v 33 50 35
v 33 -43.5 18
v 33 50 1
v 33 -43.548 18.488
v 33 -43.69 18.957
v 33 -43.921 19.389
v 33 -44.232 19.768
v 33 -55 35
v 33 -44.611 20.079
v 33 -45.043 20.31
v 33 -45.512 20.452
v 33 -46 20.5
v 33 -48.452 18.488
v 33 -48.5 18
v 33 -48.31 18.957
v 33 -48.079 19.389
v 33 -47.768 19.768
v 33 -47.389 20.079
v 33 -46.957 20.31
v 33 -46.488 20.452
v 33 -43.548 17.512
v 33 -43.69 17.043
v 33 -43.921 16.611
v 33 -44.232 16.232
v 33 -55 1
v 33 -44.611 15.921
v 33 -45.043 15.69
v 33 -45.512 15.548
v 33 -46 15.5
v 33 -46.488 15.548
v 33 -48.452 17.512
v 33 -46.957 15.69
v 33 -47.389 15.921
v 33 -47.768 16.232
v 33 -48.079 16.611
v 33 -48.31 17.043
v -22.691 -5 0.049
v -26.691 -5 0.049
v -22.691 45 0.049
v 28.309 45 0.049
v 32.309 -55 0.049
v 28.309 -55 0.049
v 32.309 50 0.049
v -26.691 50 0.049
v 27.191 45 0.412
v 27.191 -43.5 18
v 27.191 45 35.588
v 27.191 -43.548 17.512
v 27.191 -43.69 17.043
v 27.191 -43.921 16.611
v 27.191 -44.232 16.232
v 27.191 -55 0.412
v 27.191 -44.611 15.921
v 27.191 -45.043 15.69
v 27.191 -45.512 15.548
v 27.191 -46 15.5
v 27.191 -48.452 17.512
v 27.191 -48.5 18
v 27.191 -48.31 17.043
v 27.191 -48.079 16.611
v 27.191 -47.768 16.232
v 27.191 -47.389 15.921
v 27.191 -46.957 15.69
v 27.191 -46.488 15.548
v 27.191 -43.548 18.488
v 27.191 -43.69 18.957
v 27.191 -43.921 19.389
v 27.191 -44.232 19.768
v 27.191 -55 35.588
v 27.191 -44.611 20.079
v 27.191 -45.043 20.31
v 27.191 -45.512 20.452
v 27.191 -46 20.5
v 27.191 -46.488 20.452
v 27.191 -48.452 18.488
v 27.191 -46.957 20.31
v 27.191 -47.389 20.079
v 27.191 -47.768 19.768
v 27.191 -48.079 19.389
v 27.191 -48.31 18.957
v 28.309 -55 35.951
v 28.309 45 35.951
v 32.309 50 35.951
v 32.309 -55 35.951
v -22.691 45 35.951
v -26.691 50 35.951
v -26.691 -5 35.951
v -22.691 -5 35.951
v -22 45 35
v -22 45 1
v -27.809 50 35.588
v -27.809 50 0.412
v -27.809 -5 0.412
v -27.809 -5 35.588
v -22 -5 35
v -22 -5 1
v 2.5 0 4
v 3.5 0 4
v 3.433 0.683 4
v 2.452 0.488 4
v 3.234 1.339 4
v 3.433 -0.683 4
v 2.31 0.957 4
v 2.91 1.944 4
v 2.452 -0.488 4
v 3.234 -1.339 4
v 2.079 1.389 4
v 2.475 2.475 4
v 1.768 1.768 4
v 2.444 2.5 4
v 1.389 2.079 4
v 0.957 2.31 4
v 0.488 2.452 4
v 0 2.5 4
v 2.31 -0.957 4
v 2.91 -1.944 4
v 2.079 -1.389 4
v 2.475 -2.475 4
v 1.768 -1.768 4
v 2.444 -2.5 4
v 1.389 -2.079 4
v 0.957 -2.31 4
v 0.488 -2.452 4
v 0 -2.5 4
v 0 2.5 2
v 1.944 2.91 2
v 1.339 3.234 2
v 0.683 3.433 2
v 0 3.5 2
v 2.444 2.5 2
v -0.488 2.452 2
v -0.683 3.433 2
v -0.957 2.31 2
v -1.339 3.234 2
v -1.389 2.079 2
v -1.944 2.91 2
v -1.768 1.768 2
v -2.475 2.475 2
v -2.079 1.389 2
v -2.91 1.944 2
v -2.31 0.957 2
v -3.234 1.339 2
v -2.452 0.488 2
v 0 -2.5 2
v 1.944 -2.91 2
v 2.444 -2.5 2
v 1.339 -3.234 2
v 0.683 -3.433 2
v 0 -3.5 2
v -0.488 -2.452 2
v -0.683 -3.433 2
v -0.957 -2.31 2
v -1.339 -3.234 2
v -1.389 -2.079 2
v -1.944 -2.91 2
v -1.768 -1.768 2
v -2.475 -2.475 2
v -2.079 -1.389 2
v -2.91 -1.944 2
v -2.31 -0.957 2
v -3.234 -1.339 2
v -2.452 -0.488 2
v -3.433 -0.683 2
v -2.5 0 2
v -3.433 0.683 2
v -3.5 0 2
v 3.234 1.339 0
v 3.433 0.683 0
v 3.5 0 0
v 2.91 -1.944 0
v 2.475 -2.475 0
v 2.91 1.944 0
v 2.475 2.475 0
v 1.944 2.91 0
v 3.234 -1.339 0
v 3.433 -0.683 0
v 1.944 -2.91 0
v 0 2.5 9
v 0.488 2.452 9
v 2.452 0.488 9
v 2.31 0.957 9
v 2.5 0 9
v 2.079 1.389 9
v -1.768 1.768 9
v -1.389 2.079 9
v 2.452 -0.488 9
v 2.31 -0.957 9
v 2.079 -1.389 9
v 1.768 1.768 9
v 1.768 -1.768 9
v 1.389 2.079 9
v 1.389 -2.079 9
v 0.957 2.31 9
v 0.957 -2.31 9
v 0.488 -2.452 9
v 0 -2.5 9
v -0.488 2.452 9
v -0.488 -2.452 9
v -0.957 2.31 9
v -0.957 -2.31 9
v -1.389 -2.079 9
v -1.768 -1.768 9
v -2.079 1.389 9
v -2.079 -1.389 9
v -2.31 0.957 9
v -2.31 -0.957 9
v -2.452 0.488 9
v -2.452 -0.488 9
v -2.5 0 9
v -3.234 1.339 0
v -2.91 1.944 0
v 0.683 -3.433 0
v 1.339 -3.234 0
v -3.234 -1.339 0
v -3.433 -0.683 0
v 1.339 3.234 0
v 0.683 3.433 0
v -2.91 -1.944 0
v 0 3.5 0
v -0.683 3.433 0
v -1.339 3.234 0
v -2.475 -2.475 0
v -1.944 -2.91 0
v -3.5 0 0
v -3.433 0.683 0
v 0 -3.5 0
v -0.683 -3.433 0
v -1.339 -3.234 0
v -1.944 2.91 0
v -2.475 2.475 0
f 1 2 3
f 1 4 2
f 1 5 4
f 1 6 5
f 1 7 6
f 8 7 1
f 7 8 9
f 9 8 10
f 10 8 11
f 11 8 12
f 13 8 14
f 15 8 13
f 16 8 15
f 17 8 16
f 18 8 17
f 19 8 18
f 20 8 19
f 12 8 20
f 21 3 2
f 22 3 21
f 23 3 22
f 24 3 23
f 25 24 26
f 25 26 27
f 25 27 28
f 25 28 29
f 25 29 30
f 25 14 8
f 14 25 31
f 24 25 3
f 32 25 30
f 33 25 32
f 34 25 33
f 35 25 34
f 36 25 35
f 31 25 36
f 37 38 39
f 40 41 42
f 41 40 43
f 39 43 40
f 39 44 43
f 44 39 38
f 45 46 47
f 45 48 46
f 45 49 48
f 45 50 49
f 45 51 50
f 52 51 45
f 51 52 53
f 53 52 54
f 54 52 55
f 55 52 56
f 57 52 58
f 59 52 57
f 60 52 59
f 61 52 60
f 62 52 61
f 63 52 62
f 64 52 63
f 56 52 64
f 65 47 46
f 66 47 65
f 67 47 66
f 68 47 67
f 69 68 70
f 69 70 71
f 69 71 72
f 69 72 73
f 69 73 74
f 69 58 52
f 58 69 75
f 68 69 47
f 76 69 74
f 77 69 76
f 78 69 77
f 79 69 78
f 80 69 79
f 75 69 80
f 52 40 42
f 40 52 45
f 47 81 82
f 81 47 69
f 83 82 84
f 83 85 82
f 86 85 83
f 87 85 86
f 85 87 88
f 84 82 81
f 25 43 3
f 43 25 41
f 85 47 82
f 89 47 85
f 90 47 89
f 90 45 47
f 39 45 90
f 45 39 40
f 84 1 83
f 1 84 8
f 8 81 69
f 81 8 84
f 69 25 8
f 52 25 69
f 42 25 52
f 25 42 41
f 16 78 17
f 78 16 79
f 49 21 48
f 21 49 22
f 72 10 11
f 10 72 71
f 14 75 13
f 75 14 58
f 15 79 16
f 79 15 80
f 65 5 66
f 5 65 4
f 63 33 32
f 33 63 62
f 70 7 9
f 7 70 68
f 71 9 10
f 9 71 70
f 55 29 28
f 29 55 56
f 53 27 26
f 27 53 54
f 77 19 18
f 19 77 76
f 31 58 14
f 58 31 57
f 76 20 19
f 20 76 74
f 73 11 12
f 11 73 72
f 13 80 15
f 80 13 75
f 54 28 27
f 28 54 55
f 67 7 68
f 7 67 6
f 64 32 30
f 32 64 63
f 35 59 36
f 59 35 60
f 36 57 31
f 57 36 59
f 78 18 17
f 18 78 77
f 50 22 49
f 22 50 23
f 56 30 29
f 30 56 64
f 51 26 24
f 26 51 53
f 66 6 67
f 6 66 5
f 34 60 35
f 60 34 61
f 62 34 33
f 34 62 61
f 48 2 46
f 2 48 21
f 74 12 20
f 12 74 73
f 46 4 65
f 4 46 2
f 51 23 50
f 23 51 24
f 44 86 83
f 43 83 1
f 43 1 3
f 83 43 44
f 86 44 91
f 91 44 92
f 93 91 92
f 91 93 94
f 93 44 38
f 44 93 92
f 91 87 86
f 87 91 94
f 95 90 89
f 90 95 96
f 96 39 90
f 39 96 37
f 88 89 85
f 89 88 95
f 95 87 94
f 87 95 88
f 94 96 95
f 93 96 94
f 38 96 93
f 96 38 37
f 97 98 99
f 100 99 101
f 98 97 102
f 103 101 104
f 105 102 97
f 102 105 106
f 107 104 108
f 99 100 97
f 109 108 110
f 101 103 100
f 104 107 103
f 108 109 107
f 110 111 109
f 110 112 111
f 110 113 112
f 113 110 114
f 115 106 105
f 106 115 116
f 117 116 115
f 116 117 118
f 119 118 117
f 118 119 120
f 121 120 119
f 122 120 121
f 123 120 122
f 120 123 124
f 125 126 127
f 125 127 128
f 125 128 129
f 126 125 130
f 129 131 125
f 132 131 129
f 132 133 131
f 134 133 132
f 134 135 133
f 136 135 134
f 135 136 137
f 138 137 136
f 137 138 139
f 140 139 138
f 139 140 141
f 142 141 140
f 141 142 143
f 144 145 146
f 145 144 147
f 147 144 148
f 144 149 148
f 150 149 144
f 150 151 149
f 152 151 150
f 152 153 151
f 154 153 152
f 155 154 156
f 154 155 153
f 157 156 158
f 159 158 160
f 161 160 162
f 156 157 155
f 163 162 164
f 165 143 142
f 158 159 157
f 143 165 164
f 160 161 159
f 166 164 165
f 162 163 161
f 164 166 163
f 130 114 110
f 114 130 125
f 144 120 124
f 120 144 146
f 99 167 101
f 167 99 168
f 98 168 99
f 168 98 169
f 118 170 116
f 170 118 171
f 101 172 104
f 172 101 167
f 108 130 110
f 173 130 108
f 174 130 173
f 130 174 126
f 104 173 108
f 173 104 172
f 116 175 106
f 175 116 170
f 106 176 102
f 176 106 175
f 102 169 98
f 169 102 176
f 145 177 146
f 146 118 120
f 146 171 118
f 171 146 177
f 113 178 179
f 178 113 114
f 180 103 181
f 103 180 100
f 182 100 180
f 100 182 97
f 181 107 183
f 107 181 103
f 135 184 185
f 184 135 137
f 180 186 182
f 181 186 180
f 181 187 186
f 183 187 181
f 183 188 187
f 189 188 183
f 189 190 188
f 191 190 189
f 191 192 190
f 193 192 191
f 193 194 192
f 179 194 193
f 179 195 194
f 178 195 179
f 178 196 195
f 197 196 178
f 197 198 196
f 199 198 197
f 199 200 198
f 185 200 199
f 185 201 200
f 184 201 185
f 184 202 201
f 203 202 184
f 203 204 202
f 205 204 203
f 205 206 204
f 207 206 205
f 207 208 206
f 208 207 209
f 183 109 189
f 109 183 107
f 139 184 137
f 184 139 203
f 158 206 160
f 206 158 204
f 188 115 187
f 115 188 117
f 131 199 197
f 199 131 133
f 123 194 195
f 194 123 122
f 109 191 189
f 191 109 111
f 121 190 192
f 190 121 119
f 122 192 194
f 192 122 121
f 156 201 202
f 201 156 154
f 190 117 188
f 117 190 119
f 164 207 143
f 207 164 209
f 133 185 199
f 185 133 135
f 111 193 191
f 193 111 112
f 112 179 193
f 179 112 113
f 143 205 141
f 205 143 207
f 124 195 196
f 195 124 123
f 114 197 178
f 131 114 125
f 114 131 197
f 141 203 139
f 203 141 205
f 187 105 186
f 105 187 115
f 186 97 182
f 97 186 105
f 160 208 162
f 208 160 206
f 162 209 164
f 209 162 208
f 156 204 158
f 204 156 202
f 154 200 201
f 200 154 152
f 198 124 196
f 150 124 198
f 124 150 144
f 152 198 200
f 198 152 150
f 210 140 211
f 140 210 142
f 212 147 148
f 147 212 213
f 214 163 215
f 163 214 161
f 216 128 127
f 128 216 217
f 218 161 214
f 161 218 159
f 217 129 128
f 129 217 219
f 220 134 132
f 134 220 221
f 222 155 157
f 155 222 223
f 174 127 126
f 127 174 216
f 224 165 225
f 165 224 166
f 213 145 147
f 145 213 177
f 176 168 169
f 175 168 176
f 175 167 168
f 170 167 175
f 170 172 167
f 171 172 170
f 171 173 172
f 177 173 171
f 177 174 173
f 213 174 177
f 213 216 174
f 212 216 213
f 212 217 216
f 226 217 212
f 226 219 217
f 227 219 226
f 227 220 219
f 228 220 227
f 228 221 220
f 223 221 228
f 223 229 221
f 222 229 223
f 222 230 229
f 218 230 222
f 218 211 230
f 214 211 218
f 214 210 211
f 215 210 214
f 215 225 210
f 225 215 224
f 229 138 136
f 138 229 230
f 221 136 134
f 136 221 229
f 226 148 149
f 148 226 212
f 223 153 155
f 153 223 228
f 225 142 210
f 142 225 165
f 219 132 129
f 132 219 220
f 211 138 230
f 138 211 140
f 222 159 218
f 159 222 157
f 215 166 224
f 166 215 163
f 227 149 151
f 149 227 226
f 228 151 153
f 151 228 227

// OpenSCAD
// [FL_INDEX: keywords="openscad, 3d_parametric, Cubical_Clock__or_other__Hanger, csg_solid" | COT="Parametric OpenSCAD design from 3DCodeverse"]
// Title: Cubical Clock (or other) Hanger

// ===== file: clock_stand.scad =====
// preview[view:south west, tilt:top diagonal]

/* [General Settings] */
// How thick is the cubical wall?
wall_thickness = 50;//[15:75]

// How long should the back side be?
back_height = 50;//[15:100]

// How long should the front side be?
front_height = 100;//[30:150]

// Adjust the resolution
resolution = 32;//[16:36]
$cf=resolution;

// How wide should the hanger be?
hanger_width = 35;//[5:75]

// How thick should the plastic be?
hanger_thickness = 5;//[2:10]

/* [Hook Settings] */
// Diameter of the hook (this should be smaller than the hole for clearance).
hook_diameter = 7;//[1:25]

// Thickness of the hook (shallower than hole depth for clearance).
hook_depth = 2;//[1:10]

// Diameter of the bar (this should be smaller than the smallest part of the hole for clearance).
bar_diameter = 5;//[1:20]

// Length of the hook bar (slightly larger than keyhole material thickness).
bar_depth = 2;//[1:10]

/* [Hidden] */

edge_radius = 1;

main(); //runs program

module main(){

	translate( [-wall_thickness / 2, front_height / 2, hanger_width / 2 + edge_radius / 2] ) rotate( a=[ 90, 0, 0] ) {
		//Top
		translate( [( wall_thickness + hanger_thickness ) / 2, 0, 0] ) {
			roundedRect( size = [( wall_thickness + 2 * hanger_thickness ), hanger_width, hanger_thickness], radius = edge_radius );
		}

		//Back
		translate( [0, 0, hanger_thickness] ) {
			roundedRect( size = [hanger_thickness, hanger_width, back_height], radius = edge_radius );
		}

		//Front
		difference() {
			translate( [( wall_thickness + hanger_thickness ), 0, hanger_thickness] ) roundedRect( size = [hanger_thickness, hanger_width, front_height], radius = edge_radius );
			translate( [( wall_thickness + 1.5 * hanger_thickness + hook_depth + bar_depth ), 0, ( front_height - ( hook_diameter / 2 ) + hook_depth - 0.5 * hanger_thickness )] ) rotate(a=[0, 270, 0]) cylinder( h = bar_depth + 2 * hanger_thickness, r = ( bar_diameter / 2 ), $fn = $cf );
		}
	}

	//Hooks
	drawHook();
}

module drawHook() {

	large_radius = ( hook_diameter / 2 );
	small_radius = ( bar_diameter / 2 );

	cylinder( h = hook_depth, r1 = large_radius, r2 = large_radius, $fn = $cf );

	translate( [ 0, 0, hook_depth ] ) {

		cylinder( h = bar_depth + hanger_thickness, r1 = small_radius, r2 = small_radius, $fn = $cf );

		intersection() {

			translate( [0, -small_radius, 0] ) {
				cube( [hook_diameter, bar_diameter, bar_depth] );
			}

			cylinder( h = bar_depth, r1 = large_radius, r2 = large_radius, $fn = $cf );
		}
	}
}

module roundedRect( size, radius ) {

	x = size[0];
	y = size[1];
	z = size[2];

	linear_extrude( height = z )

	hull() {

		// place 4 circles in the corners, with the given radius
		translate( [( -x / 2 ) + ( radius / 2 ), ( -y / 2 ) + ( radius / 2 ), 0] ) circle( r = radius );

		translate( [( x / 2 ) - ( radius / 2 ), ( -y / 2 ) + ( radius / 2 ), 0] ) circle( r = radius );

		translate( [( -x / 2 ) + ( radius / 2 ), ( y / 2 ) - ( radius / 2 ), 0] ) circle( r = radius );

		translate( [( x / 2 ) - ( radius / 2 ), ( y / 2 ) - ( radius / 2 ), 0] ) circle( r = radius );
	}
}
